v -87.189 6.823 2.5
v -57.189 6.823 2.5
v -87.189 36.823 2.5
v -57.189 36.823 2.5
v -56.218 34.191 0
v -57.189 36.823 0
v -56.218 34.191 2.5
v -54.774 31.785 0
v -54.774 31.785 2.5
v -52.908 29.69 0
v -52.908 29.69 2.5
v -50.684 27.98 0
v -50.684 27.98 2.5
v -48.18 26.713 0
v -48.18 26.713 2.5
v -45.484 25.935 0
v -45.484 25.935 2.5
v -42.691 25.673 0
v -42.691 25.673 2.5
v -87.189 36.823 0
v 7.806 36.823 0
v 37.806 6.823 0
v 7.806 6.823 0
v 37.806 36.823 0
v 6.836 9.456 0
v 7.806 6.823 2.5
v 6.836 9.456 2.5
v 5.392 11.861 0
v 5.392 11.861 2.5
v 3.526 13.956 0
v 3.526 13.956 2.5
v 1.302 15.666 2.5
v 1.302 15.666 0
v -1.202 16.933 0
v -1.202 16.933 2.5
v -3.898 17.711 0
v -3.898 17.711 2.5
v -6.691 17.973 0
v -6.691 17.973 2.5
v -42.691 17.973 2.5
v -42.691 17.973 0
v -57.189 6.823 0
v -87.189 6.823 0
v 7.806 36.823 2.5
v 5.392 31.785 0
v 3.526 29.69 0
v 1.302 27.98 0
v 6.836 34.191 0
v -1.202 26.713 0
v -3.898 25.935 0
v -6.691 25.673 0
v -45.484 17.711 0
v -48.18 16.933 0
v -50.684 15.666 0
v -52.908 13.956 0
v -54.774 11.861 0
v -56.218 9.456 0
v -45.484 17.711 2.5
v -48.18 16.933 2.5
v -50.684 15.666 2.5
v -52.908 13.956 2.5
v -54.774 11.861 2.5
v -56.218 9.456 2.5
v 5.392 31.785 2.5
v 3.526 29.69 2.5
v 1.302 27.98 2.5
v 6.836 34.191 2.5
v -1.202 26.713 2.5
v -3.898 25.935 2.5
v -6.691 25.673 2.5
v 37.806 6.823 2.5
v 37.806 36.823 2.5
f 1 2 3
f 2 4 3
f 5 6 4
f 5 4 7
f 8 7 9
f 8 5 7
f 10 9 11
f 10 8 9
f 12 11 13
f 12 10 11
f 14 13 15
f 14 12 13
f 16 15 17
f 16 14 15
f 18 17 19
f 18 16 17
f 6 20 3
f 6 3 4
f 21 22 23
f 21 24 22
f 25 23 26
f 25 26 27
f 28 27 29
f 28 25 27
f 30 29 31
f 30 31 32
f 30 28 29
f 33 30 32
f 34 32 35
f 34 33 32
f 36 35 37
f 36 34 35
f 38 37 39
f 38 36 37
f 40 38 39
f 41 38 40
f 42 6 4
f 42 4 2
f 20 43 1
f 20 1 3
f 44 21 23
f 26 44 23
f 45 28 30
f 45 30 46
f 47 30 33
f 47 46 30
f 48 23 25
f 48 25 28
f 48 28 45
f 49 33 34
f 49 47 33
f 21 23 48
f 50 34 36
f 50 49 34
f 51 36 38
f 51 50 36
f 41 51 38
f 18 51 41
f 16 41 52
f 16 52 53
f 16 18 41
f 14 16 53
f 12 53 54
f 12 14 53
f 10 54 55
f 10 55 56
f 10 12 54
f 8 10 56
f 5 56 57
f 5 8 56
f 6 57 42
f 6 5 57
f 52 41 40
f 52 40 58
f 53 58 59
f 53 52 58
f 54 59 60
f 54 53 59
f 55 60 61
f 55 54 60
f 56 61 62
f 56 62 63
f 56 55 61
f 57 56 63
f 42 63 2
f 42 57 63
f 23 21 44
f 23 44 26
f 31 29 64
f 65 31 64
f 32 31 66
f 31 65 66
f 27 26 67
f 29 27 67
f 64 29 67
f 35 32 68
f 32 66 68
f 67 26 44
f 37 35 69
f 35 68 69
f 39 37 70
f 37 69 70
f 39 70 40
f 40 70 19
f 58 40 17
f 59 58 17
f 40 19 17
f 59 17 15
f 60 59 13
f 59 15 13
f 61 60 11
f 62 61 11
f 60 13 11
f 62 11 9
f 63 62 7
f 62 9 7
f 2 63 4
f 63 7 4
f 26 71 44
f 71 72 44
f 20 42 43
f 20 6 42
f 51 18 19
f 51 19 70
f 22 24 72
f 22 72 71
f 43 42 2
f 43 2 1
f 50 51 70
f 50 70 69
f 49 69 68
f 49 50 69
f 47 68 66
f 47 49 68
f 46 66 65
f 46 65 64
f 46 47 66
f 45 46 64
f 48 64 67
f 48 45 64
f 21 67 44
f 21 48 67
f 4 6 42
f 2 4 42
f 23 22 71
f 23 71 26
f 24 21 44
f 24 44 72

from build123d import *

# Parameters (mm, degrees)
BOSS_EXTRUDE1_DEPTH      = 2.5
SPLIT1_SURFACE_1_1_BACK  = 129.569
SPLIT1_SURFACE_1_1_DEPTH = 259.138
SPLIT1_SURFACE_1_2_BACK  = 129.569
SPLIT1_SURFACE_1_2_DEPTH = 259.138
SPLIT1_SURFACE_2_3_BACK  = 129.569
SPLIT1_SURFACE_2_3_DEPTH = 259.138
SPLIT1_SURFACE_2_4_BACK  = 129.569
SPLIT1_SURFACE_2_4_DEPTH = 259.138


with BuildPart() as part:
    # Sketch1 → Boss-Extrude1 (new body)
    with BuildSketch(Plane.XY):
        with BuildLine():
            Line((-87.188517058, 6.82308605), (-87.188517058, 36.82308605))
            Line((-87.188517058, 36.82308605), (-57.188517058, 36.82308605))
            ThreePointArc((-57.188517058, 36.82308605), (-51.835687852, 28.782964099), (-42.691017273, 25.67308605))
            Line((-42.691017273, 25.67308605), (-6.691017273, 25.67308605))
            ThreePointArc((-6.691017273, 25.67308605), (2.453653306, 28.782964099), (7.806482511, 36.82308605))
            Line((7.806482511, 36.82308605), (37.806482511, 36.82308605))
            Line((37.806482511, 36.82308605), (37.806482511, 6.82308605))
            Line((37.806482511, 6.82308605), (7.806482511, 6.82308605))
            ThreePointArc((7.806482511, 6.82308605), (2.453653306, 14.863208001), (-6.691017273, 17.97308605))
            Line((-6.691017273, 17.97308605), (-42.691017273, 17.97308605))
            ThreePointArc((-42.691017273, 17.97308605), (-51.835687852, 14.863208001), (-57.188517058, 6.82308605))
            Line((-57.188517058, 6.82308605), (-87.188517058, 6.82308605))
        make_face()
    extrude(amount=BOSS_EXTRUDE1_DEPTH)


with BuildPart() as body_2:
    # Split1: the piece behind the surface
    add(part.part)
    # Split1 surface 1: a surface, the sketch's curves swept straight by 259.138 mm
    with BuildLine(Plane.XY.offset(2.5).offset(-SPLIT1_SURFACE_1_1_BACK), mode=Mode.PRIVATE) as split1_surface_1_1_path:
        Line((-57.188517058, 36.82308605), (-57.188517058, 6.82308605))
    split1_surface_1_1 = Shell.extrude(split1_surface_1_1_path.wire(), (0 * SPLIT1_SURFACE_1_1_DEPTH, 0 * SPLIT1_SURFACE_1_1_DEPTH, 1 * SPLIT1_SURFACE_1_1_DEPTH))
    split(bisect_by=split1_surface_1_1, keep=Keep.BOTTOM)


with BuildPart() as part_1:
    add(part.part)

    # Split1: split by a surface, the side it looks to stays
    # Split1 surface 1: a surface, the sketch's curves swept straight by 259.138 mm
    with BuildLine(Plane.XY.offset(2.5).offset(-SPLIT1_SURFACE_1_2_BACK), mode=Mode.PRIVATE) as split1_surface_1_2_path:
        Line((-57.188517058, 36.82308605), (-57.188517058, 6.82308605))
    split1_surface_1_2 = Shell.extrude(split1_surface_1_2_path.wire(), (0 * SPLIT1_SURFACE_1_2_DEPTH, 0 * SPLIT1_SURFACE_1_2_DEPTH, 1 * SPLIT1_SURFACE_1_2_DEPTH))
    split(bisect_by=split1_surface_1_2, keep=Keep.TOP)


with BuildPart() as body_3:
    # Split1 2: the piece behind the surface
    add(part_1.part)
    # Split1 surface 2: a surface, the sketch's curves swept straight by 259.138 mm
    with BuildLine(Plane.XY.offset(2.5).offset(-SPLIT1_SURFACE_2_3_BACK), mode=Mode.PRIVATE) as split1_surface_2_3_path:
        Line((7.806482511, 36.82308605), (7.806482511, 6.82308605))
    split1_surface_2_3 = Shell.extrude(split1_surface_2_3_path.wire(), (0 * SPLIT1_SURFACE_2_3_DEPTH, 0 * SPLIT1_SURFACE_2_3_DEPTH, 1 * SPLIT1_SURFACE_2_3_DEPTH))
    split(bisect_by=split1_surface_2_3, keep=Keep.BOTTOM)


with BuildPart() as part_2:
    add(part_1.part)

    # Split1 2: split by a surface, the side it looks to stays
    # Split1 surface 2: a surface, the sketch's curves swept straight by 259.138 mm
    with BuildLine(Plane.XY.offset(2.5).offset(-SPLIT1_SURFACE_2_4_BACK), mode=Mode.PRIVATE) as split1_surface_2_4_path:
        Line((7.806482511, 36.82308605), (7.806482511, 6.82308605))
    split1_surface_2_4 = Shell.extrude(split1_surface_2_4_path.wire(), (0 * SPLIT1_SURFACE_2_4_DEPTH, 0 * SPLIT1_SURFACE_2_4_DEPTH, 1 * SPLIT1_SURFACE_2_4_DEPTH))
    split(bisect_by=split1_surface_2_4, keep=Keep.TOP)


solid = Compound([body_2.part, body_3.part, part_2.part])
